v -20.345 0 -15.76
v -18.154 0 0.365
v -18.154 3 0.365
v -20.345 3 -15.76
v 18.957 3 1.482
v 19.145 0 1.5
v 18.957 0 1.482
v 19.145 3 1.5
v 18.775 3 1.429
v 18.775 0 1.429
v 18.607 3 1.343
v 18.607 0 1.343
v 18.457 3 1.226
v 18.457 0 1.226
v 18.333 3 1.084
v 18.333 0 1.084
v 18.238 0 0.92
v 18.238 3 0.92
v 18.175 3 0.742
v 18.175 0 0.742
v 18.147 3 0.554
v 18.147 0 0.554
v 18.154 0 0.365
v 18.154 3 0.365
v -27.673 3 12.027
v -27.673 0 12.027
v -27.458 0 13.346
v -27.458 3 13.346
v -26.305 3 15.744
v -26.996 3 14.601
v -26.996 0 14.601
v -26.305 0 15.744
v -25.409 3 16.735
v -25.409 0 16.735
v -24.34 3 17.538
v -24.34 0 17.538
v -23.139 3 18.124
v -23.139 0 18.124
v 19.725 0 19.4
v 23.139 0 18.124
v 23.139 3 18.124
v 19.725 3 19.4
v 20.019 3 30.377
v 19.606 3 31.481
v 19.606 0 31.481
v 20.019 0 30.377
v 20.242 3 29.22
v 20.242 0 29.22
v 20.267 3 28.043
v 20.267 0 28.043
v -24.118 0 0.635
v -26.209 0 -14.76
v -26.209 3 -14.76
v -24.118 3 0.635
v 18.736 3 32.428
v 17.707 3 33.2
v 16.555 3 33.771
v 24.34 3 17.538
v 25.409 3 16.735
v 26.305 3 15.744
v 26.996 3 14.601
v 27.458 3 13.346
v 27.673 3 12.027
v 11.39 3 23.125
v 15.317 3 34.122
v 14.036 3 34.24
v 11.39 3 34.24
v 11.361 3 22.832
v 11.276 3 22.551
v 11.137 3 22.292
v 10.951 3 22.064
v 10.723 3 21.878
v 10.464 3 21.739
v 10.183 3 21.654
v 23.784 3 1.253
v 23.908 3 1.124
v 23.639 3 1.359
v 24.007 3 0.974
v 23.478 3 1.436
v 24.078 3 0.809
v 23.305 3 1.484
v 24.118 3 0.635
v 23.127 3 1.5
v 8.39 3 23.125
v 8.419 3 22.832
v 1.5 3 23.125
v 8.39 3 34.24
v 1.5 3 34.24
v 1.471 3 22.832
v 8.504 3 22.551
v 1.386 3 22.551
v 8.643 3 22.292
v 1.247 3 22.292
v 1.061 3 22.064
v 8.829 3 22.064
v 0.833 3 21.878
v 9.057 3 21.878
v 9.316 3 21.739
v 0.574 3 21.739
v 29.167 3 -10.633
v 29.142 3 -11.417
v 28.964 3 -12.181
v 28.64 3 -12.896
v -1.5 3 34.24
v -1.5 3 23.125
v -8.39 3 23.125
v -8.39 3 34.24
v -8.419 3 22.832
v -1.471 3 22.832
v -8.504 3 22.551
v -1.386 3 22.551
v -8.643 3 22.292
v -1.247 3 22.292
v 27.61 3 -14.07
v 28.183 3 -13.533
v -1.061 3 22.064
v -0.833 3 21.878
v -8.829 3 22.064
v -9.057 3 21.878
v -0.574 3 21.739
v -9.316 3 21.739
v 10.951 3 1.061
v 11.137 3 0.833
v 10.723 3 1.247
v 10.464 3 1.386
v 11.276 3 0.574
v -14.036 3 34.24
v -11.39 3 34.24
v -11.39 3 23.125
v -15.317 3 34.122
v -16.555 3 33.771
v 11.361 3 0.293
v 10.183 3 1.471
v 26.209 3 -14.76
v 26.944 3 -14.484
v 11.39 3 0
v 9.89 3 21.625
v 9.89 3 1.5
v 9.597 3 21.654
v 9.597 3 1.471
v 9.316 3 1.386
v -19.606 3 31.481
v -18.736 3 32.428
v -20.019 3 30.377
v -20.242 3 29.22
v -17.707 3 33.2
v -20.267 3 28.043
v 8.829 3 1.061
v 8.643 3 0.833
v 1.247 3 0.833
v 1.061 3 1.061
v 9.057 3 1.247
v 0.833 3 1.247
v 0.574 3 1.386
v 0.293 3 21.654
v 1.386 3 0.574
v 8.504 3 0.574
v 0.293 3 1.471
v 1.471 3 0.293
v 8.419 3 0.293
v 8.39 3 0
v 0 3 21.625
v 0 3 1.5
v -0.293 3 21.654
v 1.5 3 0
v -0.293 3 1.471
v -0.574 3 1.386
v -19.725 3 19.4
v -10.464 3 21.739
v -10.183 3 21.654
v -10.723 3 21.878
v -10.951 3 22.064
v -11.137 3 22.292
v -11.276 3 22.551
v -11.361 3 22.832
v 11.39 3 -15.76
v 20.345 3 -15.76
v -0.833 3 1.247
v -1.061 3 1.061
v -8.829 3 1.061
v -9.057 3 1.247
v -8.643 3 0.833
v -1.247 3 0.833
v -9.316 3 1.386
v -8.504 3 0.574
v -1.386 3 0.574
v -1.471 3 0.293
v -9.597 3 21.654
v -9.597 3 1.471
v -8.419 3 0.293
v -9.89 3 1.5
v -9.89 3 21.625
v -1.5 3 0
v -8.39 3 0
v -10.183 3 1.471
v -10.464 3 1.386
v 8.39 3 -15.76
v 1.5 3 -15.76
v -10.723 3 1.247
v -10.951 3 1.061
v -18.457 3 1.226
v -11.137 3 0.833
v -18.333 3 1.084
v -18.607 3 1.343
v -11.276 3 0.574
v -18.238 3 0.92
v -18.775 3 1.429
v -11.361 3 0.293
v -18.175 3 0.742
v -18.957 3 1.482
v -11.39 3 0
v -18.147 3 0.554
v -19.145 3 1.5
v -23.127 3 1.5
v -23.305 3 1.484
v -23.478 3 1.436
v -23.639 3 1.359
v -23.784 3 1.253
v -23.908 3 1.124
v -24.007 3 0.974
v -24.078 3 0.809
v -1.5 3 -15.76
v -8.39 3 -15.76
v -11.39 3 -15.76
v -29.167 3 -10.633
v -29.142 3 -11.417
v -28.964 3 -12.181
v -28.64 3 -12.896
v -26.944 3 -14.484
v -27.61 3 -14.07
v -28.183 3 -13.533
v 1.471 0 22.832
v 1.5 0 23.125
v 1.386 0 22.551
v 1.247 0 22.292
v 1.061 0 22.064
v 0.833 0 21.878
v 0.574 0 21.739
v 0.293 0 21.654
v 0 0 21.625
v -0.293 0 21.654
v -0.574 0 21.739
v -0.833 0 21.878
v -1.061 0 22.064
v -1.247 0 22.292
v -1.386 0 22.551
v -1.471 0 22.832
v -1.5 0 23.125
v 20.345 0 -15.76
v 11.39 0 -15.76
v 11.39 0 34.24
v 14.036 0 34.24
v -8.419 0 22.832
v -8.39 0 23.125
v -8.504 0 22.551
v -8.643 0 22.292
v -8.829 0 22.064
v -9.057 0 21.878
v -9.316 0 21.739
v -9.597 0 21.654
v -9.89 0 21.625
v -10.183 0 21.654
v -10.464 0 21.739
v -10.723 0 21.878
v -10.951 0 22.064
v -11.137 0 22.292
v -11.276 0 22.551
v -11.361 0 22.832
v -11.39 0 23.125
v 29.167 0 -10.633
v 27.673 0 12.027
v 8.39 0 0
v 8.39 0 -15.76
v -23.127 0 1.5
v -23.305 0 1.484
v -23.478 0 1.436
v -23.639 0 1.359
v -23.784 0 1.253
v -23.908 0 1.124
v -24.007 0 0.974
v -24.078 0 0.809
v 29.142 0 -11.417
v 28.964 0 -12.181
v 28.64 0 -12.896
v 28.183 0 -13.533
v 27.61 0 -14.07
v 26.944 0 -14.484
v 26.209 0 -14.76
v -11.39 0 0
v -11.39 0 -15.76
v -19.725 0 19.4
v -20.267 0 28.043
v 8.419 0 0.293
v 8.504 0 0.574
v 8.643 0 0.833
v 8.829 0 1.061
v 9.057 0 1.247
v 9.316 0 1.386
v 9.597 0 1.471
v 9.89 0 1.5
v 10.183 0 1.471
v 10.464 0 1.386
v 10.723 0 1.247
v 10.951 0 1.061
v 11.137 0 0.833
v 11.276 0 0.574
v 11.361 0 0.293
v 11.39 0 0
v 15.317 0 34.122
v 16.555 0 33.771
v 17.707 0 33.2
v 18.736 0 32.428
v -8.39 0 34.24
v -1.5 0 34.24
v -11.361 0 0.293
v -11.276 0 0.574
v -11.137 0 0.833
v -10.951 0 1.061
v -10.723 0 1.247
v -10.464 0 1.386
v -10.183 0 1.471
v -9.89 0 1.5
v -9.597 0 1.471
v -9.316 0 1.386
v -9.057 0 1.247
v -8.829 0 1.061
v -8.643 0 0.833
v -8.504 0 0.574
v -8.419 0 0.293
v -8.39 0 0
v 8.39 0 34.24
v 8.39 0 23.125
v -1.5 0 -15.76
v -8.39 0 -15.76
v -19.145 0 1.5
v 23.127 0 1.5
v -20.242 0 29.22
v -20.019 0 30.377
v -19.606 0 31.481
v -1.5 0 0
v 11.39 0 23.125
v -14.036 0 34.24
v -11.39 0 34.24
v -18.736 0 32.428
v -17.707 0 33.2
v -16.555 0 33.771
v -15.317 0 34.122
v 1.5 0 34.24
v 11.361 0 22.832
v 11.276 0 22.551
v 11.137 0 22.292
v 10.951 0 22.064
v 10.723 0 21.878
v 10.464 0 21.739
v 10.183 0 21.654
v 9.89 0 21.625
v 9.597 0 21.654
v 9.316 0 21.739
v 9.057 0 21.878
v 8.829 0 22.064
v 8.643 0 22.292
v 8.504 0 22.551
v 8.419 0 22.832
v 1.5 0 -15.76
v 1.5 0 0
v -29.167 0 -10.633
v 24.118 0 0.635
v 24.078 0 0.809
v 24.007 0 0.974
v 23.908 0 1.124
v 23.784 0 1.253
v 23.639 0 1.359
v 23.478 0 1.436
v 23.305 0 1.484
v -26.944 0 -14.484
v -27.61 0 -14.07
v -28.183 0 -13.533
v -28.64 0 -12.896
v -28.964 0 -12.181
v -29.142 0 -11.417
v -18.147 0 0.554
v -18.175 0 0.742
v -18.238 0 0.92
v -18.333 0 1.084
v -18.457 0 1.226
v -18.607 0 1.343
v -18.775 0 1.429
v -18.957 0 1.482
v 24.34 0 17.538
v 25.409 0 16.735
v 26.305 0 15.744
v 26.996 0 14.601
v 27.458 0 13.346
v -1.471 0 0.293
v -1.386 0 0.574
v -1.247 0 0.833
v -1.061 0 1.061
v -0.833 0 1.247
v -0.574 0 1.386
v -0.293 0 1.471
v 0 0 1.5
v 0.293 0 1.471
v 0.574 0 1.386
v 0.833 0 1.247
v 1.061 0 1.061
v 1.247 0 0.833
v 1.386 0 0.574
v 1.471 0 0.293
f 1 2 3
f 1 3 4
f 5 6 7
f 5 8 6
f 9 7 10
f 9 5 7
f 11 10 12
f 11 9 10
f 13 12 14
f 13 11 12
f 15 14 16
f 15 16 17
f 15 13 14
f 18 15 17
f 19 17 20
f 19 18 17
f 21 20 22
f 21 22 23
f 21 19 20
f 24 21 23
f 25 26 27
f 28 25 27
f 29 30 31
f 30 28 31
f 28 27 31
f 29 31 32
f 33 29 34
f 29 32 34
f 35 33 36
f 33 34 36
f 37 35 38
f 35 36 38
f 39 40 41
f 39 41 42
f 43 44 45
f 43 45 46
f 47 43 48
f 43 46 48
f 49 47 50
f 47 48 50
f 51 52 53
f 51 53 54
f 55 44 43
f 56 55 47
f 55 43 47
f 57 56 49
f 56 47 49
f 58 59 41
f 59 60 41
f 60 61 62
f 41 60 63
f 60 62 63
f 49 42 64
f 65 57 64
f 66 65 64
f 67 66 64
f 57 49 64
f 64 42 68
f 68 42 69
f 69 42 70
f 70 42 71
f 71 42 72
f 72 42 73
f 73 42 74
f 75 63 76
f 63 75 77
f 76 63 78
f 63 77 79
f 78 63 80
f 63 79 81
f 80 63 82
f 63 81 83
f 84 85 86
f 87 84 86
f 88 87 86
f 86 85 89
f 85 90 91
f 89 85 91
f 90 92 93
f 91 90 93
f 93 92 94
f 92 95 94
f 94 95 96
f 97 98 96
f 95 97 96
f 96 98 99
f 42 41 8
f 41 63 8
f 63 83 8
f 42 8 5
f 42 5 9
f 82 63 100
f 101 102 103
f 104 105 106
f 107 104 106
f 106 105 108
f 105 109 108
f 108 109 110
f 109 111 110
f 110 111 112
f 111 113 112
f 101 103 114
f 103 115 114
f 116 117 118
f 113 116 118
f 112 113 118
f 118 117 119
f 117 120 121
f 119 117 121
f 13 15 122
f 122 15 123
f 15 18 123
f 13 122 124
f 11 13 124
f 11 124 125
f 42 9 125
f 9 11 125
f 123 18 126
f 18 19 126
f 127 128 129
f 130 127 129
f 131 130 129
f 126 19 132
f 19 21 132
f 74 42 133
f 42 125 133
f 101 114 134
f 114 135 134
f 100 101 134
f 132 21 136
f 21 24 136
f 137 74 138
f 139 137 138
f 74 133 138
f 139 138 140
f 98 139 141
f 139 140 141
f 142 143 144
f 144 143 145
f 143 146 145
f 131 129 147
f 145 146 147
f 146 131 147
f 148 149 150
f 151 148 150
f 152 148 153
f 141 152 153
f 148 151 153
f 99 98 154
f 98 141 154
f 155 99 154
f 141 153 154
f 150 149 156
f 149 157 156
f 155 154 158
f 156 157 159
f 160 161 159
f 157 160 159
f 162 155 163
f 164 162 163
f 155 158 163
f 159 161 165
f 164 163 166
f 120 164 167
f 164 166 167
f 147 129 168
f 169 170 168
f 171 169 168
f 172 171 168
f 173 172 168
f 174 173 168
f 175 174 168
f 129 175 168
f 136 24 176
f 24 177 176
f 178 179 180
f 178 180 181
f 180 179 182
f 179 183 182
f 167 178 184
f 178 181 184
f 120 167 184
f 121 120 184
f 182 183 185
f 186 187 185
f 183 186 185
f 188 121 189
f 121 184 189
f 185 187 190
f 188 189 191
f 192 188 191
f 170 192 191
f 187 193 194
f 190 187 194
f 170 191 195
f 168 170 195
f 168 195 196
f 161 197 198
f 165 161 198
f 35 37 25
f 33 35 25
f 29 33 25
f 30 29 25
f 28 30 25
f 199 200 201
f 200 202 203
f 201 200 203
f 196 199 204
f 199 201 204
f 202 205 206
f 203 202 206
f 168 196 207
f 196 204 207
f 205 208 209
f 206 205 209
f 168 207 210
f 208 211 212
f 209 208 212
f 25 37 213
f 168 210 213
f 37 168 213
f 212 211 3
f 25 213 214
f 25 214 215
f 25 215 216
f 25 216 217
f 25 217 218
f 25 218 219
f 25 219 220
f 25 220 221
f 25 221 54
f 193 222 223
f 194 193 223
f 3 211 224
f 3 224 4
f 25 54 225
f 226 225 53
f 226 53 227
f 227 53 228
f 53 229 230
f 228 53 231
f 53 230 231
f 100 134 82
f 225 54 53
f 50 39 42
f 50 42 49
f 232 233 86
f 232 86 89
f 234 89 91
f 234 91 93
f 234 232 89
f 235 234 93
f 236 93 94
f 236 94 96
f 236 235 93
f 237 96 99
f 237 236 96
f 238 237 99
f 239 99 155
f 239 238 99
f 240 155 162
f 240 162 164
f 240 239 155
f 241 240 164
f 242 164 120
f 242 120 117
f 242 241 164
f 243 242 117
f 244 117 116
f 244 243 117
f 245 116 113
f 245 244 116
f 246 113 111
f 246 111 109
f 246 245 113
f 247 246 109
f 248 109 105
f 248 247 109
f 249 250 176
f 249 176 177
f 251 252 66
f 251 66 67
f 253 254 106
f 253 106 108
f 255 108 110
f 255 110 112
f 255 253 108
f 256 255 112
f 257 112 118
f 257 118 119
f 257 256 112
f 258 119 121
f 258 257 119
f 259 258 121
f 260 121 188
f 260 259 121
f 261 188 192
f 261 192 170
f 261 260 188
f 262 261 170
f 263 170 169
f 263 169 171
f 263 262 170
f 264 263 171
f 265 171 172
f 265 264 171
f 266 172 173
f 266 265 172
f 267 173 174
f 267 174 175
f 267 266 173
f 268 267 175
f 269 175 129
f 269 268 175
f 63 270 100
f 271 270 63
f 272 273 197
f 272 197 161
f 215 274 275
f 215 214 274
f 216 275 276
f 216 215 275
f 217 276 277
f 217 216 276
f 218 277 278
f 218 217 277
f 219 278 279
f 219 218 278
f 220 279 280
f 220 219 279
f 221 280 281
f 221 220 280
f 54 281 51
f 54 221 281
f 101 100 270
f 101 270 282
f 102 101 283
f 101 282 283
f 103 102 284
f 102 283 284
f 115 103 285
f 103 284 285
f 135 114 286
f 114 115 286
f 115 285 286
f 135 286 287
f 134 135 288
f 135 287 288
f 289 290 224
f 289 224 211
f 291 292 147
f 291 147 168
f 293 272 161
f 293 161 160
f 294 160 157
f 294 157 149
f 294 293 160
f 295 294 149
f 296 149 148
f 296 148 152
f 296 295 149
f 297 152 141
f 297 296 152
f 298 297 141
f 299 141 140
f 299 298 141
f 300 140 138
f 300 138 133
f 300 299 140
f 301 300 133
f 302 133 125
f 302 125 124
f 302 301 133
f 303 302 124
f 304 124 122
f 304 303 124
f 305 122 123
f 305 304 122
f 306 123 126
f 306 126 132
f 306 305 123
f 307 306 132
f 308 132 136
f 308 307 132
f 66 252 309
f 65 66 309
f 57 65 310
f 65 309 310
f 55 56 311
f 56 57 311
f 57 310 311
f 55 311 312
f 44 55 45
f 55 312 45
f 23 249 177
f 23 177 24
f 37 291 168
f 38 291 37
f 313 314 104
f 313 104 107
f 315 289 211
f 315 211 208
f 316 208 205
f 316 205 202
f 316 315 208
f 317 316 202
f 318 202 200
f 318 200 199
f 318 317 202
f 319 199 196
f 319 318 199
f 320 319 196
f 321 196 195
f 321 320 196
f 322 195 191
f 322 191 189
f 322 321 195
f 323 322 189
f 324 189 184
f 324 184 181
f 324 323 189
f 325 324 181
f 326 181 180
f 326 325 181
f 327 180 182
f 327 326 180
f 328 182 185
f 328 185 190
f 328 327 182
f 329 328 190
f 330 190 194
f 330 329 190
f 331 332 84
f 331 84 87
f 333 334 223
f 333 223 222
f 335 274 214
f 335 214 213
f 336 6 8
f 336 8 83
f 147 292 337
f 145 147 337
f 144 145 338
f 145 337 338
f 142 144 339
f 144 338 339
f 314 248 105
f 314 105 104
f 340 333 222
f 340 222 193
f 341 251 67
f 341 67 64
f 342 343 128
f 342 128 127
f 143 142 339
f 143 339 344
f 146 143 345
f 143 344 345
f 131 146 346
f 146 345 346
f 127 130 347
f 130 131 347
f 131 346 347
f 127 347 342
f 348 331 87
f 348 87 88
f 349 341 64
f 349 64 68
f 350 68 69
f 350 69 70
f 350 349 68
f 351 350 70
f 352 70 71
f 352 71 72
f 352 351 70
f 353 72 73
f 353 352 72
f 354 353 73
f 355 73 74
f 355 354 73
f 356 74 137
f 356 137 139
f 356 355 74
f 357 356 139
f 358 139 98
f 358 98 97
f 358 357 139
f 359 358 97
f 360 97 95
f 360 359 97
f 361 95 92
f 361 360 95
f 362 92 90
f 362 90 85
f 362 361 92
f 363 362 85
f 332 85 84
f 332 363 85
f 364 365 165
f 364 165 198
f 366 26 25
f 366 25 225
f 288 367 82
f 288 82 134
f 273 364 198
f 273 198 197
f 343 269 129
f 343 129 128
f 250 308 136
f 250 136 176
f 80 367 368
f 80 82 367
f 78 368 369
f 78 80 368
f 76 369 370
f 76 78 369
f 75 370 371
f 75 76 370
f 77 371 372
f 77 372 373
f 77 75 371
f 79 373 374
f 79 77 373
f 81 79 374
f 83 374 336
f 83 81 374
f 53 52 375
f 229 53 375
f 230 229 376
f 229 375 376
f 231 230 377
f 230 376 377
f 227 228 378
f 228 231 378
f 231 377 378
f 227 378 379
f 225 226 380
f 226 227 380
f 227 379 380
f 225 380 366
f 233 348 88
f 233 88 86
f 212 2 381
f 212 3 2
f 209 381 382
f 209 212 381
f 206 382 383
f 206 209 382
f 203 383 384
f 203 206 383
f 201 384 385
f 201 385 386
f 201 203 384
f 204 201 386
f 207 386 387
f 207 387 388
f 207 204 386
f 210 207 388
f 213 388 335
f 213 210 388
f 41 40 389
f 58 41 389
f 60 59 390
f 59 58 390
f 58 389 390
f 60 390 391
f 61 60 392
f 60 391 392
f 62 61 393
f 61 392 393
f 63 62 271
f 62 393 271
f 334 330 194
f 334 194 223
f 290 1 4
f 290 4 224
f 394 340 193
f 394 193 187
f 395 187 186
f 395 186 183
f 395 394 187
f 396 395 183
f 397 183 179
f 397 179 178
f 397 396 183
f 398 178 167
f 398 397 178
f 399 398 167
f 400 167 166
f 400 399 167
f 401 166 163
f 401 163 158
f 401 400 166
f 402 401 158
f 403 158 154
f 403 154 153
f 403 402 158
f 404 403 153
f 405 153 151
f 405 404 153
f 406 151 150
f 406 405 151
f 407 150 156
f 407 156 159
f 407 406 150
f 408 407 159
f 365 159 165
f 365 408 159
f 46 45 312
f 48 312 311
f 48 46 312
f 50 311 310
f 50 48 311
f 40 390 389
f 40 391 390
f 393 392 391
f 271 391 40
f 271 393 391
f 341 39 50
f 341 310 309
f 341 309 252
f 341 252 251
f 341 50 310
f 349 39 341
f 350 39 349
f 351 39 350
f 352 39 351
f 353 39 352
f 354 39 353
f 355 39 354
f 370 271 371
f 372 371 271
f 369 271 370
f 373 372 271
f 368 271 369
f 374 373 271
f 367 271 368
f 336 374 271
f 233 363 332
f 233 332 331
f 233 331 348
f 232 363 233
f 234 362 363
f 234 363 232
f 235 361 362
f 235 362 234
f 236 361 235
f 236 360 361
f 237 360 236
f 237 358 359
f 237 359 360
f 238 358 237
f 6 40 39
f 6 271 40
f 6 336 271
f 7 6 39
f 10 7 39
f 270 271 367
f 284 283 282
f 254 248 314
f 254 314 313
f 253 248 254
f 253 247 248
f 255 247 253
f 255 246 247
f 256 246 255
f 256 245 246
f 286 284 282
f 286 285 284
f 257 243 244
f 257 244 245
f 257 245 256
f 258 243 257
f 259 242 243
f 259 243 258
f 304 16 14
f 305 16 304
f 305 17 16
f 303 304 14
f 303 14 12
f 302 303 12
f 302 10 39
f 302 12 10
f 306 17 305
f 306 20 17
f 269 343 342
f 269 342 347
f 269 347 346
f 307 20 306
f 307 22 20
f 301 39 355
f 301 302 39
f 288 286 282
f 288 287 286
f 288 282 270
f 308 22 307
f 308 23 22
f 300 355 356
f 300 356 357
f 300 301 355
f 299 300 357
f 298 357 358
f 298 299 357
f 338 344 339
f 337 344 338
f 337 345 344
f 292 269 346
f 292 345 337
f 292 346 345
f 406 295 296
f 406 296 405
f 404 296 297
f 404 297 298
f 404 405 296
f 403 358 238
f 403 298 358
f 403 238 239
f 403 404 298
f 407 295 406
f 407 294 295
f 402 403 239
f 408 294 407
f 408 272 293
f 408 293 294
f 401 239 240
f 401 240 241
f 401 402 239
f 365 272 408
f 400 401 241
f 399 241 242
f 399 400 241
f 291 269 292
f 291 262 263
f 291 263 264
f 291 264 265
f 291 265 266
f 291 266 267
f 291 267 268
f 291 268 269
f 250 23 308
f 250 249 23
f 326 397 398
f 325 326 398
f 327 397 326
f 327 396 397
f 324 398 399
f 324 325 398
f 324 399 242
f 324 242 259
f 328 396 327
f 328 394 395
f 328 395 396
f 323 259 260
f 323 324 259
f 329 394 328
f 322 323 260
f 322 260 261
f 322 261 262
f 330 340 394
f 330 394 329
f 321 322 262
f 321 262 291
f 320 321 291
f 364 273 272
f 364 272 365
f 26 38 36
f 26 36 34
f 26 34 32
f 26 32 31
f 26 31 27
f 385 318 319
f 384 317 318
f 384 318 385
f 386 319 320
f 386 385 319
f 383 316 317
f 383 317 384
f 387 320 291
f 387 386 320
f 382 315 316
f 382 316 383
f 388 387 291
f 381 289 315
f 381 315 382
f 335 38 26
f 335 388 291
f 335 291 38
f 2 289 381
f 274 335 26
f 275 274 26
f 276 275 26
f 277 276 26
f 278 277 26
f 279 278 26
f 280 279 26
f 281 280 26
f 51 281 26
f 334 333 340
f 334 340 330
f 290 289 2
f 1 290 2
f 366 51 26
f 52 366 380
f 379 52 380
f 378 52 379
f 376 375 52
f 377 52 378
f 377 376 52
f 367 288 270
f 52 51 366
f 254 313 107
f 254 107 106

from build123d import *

# Parameters (mm, degrees)
BOSS_EXTRUDE1_DEPTH = 3
FILLET1_R           = 4
FILLET2_R           = 1
FILLET3_R           = 7


with BuildPart() as part:
    # Sketch1 → Boss-Extrude1 (new body)
    with BuildSketch(Plane(origin=(0, 0, 0), x_dir=(1, 0, 0), z_dir=(0, 1, 0))):
        with BuildLine():
            Line((-1.5, 15.76), (-1.5, 0))
            ThreePointArc((-1.5, 0), (0, -1.5), (1.5, 0))
            Line((1.5, 0), (1.5, 15.76))
            Line((1.5, 15.76), (8.39, 15.76))
            Line((8.39, 15.76), (8.39, 0))
            ThreePointArc((8.39, 0), (9.89, -1.5), (11.39, 0))
            Line((11.39, 0), (11.39, 15.76))
            Line((11.39, 15.76), (20.345, 15.76))
            Line((20.345, 15.76), (18, -1.5))
            Line((18, -1.5), (24, -1.5))
            Line((24, -1.5), (26.209136732, 14.76))
            Line((26.209136732, 14.76), (29.439136732, 14.76))
            Line((29.439136732, 14.76), (27.375, -16.54))
            Line((27.375, -16.54), (19.725, -19.4))
            Line((19.725, -19.4), (20.405, -30.24))
            Line((20.405, -30.24), (17.97, -34.24))
            Line((17.97, -34.24), (11.39, -34.24))
            Line((11.39, -34.24), (11.39, -23.125))
            ThreePointArc((11.39, -23.125), (9.89, -21.625), (8.39, -23.125))
            Line((8.39, -23.125), (8.39, -34.24))
            Line((8.39, -34.24), (1.5, -34.24))
            Line((1.5, -34.24), (1.5, -23.125))
            ThreePointArc((1.5, -23.125), (0, -21.625), (-1.5, -23.125))
            Line((-1.5, -23.125), (-1.5, -34.24))
            Line((-1.5, -34.24), (-8.39, -34.24))
            Line((-8.39, -34.24), (-8.39, -23.125))
            ThreePointArc((-8.39, -23.125), (-9.89, -21.625), (-11.39, -23.125))
            Line((-11.39, -23.125), (-11.39, -34.24))
            Line((-11.39, -34.24), (-17.97, -34.24))
            Line((-17.97, -34.24), (-20.405, -30.24))
            Line((-20.405, -30.24), (-19.725, -19.4))
            Line((-19.725, -19.4), (-27.375, -16.54))
            Line((-27.375, -16.54), (-29.439136732, 14.76))
            Line((-29.439136732, 14.76), (-26.209136732, 14.76))
            Line((-26.209136732, 14.76), (-24, -1.5))
            Line((-24, -1.5), (-18, -1.5))
            Line((-18, -1.5), (-20.345, 15.76))
            Line((-20.345, 15.76), (-11.39, 15.76))
            Line((-11.39, 15.76), (-11.39, 0))
            ThreePointArc((-11.39, 0), (-9.89, -1.5), (-8.39, 0))
            Line((-8.39, 0), (-8.39, 15.76))
            Line((-8.39, 15.76), (-1.5, 15.76))
        make_face()
    extrude(amount=BOSS_EXTRUDE1_DEPTH)

    # Fillet1
    # the kernel refuses this fillet: 4 mm, written as the material it takes off along each edge
    with BuildSketch(Plane(origin=(-29.439136732, -10.340886874, -14.76), x_dir=(0.0658039254405357, 0, 0.9978325728280353), z_dir=(0, 1, 0))) as fillet1_piece_1:
        with BuildLine():
            CenterArc((4.136354749, 4), FILLET1_R, 191.20092555, 78.79907445)
            Line((0.212546679, 3.22299921), (0.134070518, 3.207459194))
            ThreePointArc((0.134070518, 3.207459194), (0.026446734, 1.616763919), (-0.079826606, 0.005264314))
            Line((-0.079826606, 0.005264314), (0, -0.08))
            Line((0, -0.08), (4.136354749, -0.08))
            Line((4.136354749, -0.08), (4.136354749, 0))
        make_face()
    extrude(amount=23.681773747, mode=Mode.SUBTRACT)
    with BuildSketch(Plane(origin=(29.439136732, -10.340886874, -14.76), x_dir=(-1, 0, 0), z_dir=(0, 1, 0))) as fillet1_piece_2:
        with BuildLine():
            CenterArc((4.263518671, 3.8641738), FILLET1_R, 176.226986492, 78.79907445)
            Line((0.27218838, 4.127389502), (0.192361774, 4.132653816))
            Line((0.192361774, 4.132653816), (-0.079826606, 0.005264314))
            Line((-0.079826606, 0.005264314), (0, -0.08))
            ThreePointArc((0, -0.08), (1.615, -0.08), (3.209329627, -0.077283476))
            Line((3.209329627, -0.077283476), (3.23, 0))
        make_face()
    extrude(amount=23.681773747, mode=Mode.SUBTRACT)

    # Fillet2
    fillet2_edges = [part.edges().sort_by_distance(p)[0] for p in [
        (18, 1.5, 1.5),
        (24, 1.5, 1.5),
        (-24, 1.5, 1.5),
        (-18, 1.5, 1.5),
    ]]
    fillet(fillet2_edges, radius=FILLET2_R)

    # Fillet3
    # the kernel refuses this fillet: 7 mm, written as the material it takes off along each edge
    with BuildSketch(Plane(origin=(-17.97, -9.834409558, 34.24), x_dir=(-0.5199808190603049, 0, -0.8541779368547132), z_dir=(0, 1, 0)), Plane(origin=(17.97, -9.834409558, 34.24), x_dir=(-1, 0, 0), z_dir=(0, 1, 0))) as fillet3_piece_1:
        with BuildLine():
            CenterArc((FILLET3_R * 0.561966260458, -FILLET3_R), FILLET3_R, 90, 58.669035113)
            Line((-FILLET3_R * 0.292211676397, -FILLET3_R * 0.48001918094), (0, 0))
            Line((0, 0), (FILLET3_R * 0.561966260458, 0))
        make_face()
    extrude(amount=22.668819116, mode=Mode.SUBTRACT)
    with BuildSketch(Plane(origin=(-20.405, -5.504377364, 30.24), x_dir=(0.06260756375388789, 0, -0.998038222194322), z_dir=(0, 1, 0)), Plane(origin=(20.405, -5.504377364, 30.24), x_dir=(-0.5199808190603047, 0, 0.8541779368547133), z_dir=(0, 1, 0))) as fillet3_piece_2:
        with BuildLine():
            CenterArc((FILLET3_R * 0.314535849376, -FILLET3_R), FILLET3_R, 90, 34.920461628)
            Line((-FILLET3_R * 0.257902882493, -FILLET3_R * 0.180052502744), (0, 0))
            Line((0, 0), (FILLET3_R * 0.314535849376, 0))
        make_face()
    extrude(amount=14.008754728, mode=Mode.SUBTRACT)
    with BuildSketch(Plane(origin=(-27.375, -11.305757053, 16.54), x_dir=(-0.06580392544053615, 0, -0.9978325728280353), z_dir=(0, 1, 0)), Plane(origin=(27.375, -11.305757053, 16.54), x_dir=(-0.9366809367224829, 0, 0.3501839841864447), z_dir=(0, 1, 0))) as fillet3_piece_3:
        with BuildLine():
            CenterArc((FILLET3_R * 0.646043260189, -FILLET3_R), FILLET3_R, 90, 65.728417673)
            Line((-FILLET3_R * 0.265564008034, -FILLET3_R * 0.588937731574), (0, 0))
            Line((0, 0), (FILLET3_R * 0.646043260189, 0))
        make_face()
    extrude(amount=25.611514107, mode=Mode.SUBTRACT)


solid = part.part
